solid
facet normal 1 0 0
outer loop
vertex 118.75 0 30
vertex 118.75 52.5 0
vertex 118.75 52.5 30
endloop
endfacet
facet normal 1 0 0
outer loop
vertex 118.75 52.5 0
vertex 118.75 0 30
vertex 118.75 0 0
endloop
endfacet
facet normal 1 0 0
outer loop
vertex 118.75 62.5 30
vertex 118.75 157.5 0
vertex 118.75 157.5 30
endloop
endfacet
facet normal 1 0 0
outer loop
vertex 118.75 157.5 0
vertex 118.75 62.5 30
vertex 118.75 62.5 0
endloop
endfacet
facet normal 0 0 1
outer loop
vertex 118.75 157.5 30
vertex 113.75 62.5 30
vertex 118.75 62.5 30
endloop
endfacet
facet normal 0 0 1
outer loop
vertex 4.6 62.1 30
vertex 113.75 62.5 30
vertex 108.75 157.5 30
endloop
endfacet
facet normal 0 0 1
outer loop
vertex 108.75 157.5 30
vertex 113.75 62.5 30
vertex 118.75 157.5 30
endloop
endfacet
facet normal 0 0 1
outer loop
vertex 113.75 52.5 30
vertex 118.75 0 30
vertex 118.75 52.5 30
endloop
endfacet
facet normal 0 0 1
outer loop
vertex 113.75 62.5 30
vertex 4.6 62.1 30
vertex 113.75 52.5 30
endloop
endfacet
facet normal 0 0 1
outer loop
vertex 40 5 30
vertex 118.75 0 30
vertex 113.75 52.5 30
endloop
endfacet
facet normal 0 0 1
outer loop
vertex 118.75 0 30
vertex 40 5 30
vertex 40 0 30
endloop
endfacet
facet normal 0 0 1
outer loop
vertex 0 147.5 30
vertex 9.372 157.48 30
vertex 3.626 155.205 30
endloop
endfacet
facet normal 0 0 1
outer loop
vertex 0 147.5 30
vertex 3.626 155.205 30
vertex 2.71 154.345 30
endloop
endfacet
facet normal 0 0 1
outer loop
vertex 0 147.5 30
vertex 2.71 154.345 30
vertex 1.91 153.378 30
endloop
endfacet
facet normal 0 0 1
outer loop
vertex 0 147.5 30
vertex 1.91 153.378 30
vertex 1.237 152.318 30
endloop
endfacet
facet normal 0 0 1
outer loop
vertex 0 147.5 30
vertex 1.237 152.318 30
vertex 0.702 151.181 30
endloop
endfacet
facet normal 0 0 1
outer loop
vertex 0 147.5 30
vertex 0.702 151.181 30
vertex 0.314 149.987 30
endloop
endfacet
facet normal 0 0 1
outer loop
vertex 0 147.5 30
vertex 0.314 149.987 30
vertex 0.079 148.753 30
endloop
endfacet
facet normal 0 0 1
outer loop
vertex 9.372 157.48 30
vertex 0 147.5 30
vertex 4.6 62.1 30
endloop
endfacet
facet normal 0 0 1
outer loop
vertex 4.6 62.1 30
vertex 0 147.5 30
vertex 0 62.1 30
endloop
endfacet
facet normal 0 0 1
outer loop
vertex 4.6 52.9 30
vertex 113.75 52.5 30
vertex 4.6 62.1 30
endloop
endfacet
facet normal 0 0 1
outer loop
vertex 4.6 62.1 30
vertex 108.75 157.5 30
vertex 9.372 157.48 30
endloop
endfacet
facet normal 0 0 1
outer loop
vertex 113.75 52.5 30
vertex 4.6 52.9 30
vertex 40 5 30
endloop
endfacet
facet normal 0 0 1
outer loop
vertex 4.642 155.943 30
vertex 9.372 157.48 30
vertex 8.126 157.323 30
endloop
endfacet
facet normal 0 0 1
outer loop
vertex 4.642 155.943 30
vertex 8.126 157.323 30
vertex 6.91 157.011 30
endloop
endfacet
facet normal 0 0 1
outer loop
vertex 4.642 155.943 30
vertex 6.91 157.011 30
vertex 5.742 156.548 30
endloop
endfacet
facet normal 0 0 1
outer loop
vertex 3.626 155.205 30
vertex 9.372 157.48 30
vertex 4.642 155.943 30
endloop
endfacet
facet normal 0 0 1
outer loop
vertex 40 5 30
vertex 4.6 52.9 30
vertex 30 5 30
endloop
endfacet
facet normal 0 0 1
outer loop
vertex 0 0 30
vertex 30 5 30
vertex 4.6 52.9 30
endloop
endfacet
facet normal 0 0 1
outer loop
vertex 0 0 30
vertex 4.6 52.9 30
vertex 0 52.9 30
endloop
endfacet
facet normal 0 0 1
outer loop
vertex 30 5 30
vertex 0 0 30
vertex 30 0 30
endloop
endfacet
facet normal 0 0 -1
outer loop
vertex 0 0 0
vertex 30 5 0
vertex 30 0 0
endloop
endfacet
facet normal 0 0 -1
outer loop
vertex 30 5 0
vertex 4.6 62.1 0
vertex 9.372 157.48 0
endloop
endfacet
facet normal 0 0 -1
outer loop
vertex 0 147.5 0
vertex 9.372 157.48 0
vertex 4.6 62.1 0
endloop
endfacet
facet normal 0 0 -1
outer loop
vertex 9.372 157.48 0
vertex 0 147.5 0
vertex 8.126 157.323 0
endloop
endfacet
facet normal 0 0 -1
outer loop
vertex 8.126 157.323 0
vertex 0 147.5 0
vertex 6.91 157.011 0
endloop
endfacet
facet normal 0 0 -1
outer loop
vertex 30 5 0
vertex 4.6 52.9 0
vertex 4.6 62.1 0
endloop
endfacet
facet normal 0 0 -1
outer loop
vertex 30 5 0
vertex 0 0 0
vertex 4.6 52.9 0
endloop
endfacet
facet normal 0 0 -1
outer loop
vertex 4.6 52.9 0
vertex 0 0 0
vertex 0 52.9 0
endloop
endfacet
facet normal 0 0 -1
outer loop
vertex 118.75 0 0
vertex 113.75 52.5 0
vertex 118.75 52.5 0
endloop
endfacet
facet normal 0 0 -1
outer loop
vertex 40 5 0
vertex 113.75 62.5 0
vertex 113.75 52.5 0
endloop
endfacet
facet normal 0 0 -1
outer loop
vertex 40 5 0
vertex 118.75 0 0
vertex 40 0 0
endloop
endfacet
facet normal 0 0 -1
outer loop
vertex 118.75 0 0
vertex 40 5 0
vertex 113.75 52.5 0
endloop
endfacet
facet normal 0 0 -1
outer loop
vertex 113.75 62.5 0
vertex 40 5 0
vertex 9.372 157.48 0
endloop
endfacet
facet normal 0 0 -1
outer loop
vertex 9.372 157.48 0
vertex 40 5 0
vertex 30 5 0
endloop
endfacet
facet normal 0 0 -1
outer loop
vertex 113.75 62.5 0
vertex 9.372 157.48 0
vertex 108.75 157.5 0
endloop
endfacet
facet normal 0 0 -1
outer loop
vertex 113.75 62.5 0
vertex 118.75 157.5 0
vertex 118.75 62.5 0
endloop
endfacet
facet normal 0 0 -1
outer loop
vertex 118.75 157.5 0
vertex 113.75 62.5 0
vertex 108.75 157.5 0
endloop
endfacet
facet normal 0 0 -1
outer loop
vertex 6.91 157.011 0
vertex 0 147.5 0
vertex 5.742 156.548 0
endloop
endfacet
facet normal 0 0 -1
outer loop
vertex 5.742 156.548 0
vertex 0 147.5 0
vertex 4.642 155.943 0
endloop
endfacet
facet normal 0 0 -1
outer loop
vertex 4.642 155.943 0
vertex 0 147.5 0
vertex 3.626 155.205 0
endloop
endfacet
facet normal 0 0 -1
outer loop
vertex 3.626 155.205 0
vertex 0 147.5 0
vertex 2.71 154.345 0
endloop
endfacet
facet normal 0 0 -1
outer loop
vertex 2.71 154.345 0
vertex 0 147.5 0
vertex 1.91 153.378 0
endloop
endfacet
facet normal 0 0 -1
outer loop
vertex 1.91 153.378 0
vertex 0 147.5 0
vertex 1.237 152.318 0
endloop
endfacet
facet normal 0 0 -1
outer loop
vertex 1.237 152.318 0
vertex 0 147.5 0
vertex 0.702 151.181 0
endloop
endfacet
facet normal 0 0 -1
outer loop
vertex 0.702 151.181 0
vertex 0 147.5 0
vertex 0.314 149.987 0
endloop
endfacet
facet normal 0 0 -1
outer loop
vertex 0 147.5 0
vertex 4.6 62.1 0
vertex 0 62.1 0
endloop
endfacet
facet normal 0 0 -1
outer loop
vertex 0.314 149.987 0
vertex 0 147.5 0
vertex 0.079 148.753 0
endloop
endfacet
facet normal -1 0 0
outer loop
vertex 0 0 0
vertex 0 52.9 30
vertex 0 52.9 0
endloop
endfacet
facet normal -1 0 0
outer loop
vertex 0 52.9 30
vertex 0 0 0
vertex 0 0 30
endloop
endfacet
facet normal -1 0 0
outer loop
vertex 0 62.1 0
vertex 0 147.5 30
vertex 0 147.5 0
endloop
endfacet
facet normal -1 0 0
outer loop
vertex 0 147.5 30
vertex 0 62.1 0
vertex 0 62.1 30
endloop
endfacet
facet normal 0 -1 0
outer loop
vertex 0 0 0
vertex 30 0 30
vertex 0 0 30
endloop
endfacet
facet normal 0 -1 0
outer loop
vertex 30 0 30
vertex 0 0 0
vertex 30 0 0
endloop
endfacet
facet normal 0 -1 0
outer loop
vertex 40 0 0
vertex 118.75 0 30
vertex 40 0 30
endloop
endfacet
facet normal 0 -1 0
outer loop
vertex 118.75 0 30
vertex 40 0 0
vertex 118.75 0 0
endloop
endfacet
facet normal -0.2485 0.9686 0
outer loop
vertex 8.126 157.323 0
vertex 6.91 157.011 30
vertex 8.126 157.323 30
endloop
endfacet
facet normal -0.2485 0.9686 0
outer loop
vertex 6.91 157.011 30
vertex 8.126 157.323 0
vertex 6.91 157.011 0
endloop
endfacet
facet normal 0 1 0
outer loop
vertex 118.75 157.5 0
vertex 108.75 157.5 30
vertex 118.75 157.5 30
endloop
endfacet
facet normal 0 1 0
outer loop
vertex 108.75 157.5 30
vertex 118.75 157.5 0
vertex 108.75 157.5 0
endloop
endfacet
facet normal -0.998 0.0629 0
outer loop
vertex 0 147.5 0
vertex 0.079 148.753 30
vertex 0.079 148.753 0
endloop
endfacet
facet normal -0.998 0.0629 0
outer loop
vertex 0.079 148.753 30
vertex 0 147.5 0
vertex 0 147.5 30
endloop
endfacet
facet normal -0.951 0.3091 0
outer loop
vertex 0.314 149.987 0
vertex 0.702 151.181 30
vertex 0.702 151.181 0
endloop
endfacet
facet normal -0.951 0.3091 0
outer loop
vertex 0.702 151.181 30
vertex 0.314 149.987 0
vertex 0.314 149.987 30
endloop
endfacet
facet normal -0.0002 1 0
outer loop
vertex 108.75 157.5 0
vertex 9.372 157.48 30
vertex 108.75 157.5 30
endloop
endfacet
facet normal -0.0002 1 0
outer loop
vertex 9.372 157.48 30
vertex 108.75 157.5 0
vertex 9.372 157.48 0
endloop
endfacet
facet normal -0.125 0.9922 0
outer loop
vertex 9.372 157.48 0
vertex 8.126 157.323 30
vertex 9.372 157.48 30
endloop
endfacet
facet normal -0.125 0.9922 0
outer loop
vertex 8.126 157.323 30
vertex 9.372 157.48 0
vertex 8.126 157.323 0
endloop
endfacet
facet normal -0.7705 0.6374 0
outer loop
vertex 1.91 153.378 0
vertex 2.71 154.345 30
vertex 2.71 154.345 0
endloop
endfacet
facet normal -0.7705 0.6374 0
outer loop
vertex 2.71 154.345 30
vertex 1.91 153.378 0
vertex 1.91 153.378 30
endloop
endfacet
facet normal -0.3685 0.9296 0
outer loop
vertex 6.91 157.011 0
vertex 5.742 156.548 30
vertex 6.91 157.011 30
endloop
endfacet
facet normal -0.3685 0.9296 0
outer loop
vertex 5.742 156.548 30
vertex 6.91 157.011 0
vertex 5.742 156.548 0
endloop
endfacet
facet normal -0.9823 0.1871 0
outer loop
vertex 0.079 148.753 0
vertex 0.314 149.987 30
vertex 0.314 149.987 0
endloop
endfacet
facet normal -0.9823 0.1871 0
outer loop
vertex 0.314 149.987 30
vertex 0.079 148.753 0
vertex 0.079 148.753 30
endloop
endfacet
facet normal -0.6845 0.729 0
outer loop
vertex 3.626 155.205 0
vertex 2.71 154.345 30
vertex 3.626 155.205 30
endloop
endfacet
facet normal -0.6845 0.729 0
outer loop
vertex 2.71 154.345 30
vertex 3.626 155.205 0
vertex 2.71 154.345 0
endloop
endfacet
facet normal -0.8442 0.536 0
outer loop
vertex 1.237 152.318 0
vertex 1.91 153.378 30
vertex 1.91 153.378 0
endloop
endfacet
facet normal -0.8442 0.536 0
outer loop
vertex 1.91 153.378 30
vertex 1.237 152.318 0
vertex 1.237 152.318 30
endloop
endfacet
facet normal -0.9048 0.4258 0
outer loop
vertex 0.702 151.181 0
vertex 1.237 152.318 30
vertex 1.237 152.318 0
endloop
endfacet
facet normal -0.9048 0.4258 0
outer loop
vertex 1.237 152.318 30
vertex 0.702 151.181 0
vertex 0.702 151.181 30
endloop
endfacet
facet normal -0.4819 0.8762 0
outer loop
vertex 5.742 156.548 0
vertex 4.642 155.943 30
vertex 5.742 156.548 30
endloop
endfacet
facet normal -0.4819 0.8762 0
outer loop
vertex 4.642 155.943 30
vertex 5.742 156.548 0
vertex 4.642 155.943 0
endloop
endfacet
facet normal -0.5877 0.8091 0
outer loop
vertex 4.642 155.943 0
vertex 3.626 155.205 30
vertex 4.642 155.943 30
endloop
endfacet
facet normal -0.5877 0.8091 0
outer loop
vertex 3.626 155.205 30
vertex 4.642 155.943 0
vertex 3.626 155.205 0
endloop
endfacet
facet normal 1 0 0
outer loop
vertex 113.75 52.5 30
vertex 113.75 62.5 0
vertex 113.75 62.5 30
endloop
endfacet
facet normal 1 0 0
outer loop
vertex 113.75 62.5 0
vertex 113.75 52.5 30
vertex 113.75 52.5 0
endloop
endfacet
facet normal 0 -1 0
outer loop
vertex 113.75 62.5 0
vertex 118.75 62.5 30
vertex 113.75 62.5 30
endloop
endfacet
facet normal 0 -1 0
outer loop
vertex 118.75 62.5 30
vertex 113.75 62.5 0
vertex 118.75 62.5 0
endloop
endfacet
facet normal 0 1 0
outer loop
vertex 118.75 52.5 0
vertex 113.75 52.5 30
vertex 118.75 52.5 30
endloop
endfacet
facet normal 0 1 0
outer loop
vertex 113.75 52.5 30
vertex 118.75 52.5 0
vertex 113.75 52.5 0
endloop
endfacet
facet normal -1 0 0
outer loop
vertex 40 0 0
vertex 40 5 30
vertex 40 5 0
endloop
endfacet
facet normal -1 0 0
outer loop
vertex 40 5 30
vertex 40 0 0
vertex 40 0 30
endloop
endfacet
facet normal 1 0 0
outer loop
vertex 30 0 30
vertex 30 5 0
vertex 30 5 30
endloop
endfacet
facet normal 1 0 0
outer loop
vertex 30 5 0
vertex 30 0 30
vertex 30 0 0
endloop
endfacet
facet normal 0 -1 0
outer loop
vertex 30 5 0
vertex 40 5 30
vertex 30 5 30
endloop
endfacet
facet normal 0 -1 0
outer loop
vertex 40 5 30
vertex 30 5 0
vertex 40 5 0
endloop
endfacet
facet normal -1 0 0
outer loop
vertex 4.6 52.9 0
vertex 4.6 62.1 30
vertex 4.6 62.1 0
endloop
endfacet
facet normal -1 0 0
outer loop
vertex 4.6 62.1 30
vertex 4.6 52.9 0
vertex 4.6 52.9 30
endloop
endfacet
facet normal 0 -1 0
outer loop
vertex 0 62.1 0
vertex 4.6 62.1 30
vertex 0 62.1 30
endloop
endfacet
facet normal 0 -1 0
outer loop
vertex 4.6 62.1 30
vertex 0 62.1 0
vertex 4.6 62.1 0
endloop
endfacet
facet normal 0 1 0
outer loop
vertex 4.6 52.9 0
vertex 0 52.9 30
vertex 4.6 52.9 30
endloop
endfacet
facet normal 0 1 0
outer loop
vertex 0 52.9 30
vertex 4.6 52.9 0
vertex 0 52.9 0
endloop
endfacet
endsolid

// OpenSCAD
$fn = 50;

length = 118.75;
width = 157.5;
height = 30;
line = 0.4;
rabbet = 10;

/* b/br */
/* union() { */
/*      difference() { */
/*           cube([length, width, height], false); */
/*           translate([length-(rabbet/2), 30, 0]) { */
/*                cube([rabbet, rabbet, height], false); */
/*           } */
/*      } */
/*      translate([-(rabbet/2)+line, 30+line, 0]) { */
/*           cube([rabbet-(2*line), rabbet-(2*line), height], false); */
/*      } */
/*      translate([length-30-rabbet+line, width-(rabbet/2)+line, 0]) { */
/*           cube([rabbet-(2*line), rabbet-(2*line), height], false); */
/*      } */
/* } */

/* bl */
/* union() { */
/*      difference() { */
/*           cube([length, width, height], false); */
/*           translate([length-5, 30, 0]) { */
/*                cube([rabbet, rabbet, height], false); */
/*           } */
/*           translate([-(rabbet/2), 30, 0]) { */
/*                cube([rabbet, rabbet, height], false); */
/*           } */
/*      } */
/*      translate([30+line, width-(rabbet/2)+line, 0]) { */
/*           cube([rabbet-(2*line), rabbet-(2*line), height], false); */
/*      } */
/* } */

/* t */
/* union() { */
/*      difference() { */
/*           cube([length, width, height], false); */
/*           translate([length-(rabbet/2), 52.5, 0]) { */
/*                cube([rabbet, rabbet, height], false); */
/*           } */
/*           translate([length-30-rabbet, -(rabbet/2), 0]) { */
/*                cube([rabbet, rabbet, height], false); */
/*           } */
/*      } */
/*      translate([-(rabbet/2)+line, 52.5+line, 0]) { */
/*           cube([rabbet-(2*line), rabbet-(2*line), height], false); */
/*      } */
/* } */

/* tr */
/* union() { */
/*      difference() { */
/*           union() { */
/*                cube([length, width-20, height], false); */
/*                hull() { */
/*                     translate([length-rabbet, width-(2*rabbet), 0]) { */
/*                          cube([rabbet, rabbet, height], false); */
/*                     } */
/*                     translate([length-rabbet, width-rabbet, 0]) { */
/*                          cylinder(height, r=rabbet, false); */
/*                     } */
/*                     translate([0, width-(2*rabbet), 0]) { */
/*                          cube([rabbet, 2*rabbet, height], false); */
/*                     } */
/*                } */
/*           } */
/*           translate([length-(rabbet/2), 52.5, 0]) { */
/*                cube([rabbet, rabbet, height], false); */
/*           } */
/*           translate([length-30-rabbet, -(rabbet/2), 0]) { */
/*                cube([rabbet, rabbet, height], false); */
/*           } */
/*      } */
/*      translate([-(rabbet/2)+line, 52.5+line, 0]) { */
/*           cube([rabbet-(2*line), rabbet-(2*line), height], false); */
/*      } */
/* } */

/* tl */
union() {
     difference() {
          union() {
               cube([length, width-20, height], false);
               hull() {
                    translate([0, width-(2*rabbet), 0]) {
                         cube([rabbet, rabbet, height], false);
                    }
                    translate([rabbet, width-rabbet, 0]) {
                         cylinder(height, r=rabbet, false);
                    }
                    translate([length-rabbet, width-(2*rabbet), 0]) {
                         cube([rabbet, 2*rabbet, height], false);
                    }
               }
          }
          translate([length-(rabbet/2), 52.5, 0]) {
               cube([rabbet, rabbet, height], false);
          }
          translate([30, -(rabbet/2), 0]) {
               cube([rabbet, rabbet, height], false);
          }
          translate([-(rabbet/2)+line, 52.5+line, 0]) {
               cube([rabbet-(2*line), rabbet-(2*line), height], false);
          }
     }
}

/* union() { */
/*      difference() { */
/*           cube([length, width, height], false); */
/*           translate([length-(rabbet/2), 52.5, 0]) { */
/*                cube([rabbet, rabbet, height], false); */
/*           } */
/*           translate([length-30-rabbet, -(rabbet/2), 0]) { */
/*                cube([rabbet, rabbet, height], false); */
/*           } */
/*           translate([-(rabbet/2), 52.5, 0]) { */
/*                cube([rabbet, rabbet, height], false); */
/*           } */
/*      } */
/* } */
